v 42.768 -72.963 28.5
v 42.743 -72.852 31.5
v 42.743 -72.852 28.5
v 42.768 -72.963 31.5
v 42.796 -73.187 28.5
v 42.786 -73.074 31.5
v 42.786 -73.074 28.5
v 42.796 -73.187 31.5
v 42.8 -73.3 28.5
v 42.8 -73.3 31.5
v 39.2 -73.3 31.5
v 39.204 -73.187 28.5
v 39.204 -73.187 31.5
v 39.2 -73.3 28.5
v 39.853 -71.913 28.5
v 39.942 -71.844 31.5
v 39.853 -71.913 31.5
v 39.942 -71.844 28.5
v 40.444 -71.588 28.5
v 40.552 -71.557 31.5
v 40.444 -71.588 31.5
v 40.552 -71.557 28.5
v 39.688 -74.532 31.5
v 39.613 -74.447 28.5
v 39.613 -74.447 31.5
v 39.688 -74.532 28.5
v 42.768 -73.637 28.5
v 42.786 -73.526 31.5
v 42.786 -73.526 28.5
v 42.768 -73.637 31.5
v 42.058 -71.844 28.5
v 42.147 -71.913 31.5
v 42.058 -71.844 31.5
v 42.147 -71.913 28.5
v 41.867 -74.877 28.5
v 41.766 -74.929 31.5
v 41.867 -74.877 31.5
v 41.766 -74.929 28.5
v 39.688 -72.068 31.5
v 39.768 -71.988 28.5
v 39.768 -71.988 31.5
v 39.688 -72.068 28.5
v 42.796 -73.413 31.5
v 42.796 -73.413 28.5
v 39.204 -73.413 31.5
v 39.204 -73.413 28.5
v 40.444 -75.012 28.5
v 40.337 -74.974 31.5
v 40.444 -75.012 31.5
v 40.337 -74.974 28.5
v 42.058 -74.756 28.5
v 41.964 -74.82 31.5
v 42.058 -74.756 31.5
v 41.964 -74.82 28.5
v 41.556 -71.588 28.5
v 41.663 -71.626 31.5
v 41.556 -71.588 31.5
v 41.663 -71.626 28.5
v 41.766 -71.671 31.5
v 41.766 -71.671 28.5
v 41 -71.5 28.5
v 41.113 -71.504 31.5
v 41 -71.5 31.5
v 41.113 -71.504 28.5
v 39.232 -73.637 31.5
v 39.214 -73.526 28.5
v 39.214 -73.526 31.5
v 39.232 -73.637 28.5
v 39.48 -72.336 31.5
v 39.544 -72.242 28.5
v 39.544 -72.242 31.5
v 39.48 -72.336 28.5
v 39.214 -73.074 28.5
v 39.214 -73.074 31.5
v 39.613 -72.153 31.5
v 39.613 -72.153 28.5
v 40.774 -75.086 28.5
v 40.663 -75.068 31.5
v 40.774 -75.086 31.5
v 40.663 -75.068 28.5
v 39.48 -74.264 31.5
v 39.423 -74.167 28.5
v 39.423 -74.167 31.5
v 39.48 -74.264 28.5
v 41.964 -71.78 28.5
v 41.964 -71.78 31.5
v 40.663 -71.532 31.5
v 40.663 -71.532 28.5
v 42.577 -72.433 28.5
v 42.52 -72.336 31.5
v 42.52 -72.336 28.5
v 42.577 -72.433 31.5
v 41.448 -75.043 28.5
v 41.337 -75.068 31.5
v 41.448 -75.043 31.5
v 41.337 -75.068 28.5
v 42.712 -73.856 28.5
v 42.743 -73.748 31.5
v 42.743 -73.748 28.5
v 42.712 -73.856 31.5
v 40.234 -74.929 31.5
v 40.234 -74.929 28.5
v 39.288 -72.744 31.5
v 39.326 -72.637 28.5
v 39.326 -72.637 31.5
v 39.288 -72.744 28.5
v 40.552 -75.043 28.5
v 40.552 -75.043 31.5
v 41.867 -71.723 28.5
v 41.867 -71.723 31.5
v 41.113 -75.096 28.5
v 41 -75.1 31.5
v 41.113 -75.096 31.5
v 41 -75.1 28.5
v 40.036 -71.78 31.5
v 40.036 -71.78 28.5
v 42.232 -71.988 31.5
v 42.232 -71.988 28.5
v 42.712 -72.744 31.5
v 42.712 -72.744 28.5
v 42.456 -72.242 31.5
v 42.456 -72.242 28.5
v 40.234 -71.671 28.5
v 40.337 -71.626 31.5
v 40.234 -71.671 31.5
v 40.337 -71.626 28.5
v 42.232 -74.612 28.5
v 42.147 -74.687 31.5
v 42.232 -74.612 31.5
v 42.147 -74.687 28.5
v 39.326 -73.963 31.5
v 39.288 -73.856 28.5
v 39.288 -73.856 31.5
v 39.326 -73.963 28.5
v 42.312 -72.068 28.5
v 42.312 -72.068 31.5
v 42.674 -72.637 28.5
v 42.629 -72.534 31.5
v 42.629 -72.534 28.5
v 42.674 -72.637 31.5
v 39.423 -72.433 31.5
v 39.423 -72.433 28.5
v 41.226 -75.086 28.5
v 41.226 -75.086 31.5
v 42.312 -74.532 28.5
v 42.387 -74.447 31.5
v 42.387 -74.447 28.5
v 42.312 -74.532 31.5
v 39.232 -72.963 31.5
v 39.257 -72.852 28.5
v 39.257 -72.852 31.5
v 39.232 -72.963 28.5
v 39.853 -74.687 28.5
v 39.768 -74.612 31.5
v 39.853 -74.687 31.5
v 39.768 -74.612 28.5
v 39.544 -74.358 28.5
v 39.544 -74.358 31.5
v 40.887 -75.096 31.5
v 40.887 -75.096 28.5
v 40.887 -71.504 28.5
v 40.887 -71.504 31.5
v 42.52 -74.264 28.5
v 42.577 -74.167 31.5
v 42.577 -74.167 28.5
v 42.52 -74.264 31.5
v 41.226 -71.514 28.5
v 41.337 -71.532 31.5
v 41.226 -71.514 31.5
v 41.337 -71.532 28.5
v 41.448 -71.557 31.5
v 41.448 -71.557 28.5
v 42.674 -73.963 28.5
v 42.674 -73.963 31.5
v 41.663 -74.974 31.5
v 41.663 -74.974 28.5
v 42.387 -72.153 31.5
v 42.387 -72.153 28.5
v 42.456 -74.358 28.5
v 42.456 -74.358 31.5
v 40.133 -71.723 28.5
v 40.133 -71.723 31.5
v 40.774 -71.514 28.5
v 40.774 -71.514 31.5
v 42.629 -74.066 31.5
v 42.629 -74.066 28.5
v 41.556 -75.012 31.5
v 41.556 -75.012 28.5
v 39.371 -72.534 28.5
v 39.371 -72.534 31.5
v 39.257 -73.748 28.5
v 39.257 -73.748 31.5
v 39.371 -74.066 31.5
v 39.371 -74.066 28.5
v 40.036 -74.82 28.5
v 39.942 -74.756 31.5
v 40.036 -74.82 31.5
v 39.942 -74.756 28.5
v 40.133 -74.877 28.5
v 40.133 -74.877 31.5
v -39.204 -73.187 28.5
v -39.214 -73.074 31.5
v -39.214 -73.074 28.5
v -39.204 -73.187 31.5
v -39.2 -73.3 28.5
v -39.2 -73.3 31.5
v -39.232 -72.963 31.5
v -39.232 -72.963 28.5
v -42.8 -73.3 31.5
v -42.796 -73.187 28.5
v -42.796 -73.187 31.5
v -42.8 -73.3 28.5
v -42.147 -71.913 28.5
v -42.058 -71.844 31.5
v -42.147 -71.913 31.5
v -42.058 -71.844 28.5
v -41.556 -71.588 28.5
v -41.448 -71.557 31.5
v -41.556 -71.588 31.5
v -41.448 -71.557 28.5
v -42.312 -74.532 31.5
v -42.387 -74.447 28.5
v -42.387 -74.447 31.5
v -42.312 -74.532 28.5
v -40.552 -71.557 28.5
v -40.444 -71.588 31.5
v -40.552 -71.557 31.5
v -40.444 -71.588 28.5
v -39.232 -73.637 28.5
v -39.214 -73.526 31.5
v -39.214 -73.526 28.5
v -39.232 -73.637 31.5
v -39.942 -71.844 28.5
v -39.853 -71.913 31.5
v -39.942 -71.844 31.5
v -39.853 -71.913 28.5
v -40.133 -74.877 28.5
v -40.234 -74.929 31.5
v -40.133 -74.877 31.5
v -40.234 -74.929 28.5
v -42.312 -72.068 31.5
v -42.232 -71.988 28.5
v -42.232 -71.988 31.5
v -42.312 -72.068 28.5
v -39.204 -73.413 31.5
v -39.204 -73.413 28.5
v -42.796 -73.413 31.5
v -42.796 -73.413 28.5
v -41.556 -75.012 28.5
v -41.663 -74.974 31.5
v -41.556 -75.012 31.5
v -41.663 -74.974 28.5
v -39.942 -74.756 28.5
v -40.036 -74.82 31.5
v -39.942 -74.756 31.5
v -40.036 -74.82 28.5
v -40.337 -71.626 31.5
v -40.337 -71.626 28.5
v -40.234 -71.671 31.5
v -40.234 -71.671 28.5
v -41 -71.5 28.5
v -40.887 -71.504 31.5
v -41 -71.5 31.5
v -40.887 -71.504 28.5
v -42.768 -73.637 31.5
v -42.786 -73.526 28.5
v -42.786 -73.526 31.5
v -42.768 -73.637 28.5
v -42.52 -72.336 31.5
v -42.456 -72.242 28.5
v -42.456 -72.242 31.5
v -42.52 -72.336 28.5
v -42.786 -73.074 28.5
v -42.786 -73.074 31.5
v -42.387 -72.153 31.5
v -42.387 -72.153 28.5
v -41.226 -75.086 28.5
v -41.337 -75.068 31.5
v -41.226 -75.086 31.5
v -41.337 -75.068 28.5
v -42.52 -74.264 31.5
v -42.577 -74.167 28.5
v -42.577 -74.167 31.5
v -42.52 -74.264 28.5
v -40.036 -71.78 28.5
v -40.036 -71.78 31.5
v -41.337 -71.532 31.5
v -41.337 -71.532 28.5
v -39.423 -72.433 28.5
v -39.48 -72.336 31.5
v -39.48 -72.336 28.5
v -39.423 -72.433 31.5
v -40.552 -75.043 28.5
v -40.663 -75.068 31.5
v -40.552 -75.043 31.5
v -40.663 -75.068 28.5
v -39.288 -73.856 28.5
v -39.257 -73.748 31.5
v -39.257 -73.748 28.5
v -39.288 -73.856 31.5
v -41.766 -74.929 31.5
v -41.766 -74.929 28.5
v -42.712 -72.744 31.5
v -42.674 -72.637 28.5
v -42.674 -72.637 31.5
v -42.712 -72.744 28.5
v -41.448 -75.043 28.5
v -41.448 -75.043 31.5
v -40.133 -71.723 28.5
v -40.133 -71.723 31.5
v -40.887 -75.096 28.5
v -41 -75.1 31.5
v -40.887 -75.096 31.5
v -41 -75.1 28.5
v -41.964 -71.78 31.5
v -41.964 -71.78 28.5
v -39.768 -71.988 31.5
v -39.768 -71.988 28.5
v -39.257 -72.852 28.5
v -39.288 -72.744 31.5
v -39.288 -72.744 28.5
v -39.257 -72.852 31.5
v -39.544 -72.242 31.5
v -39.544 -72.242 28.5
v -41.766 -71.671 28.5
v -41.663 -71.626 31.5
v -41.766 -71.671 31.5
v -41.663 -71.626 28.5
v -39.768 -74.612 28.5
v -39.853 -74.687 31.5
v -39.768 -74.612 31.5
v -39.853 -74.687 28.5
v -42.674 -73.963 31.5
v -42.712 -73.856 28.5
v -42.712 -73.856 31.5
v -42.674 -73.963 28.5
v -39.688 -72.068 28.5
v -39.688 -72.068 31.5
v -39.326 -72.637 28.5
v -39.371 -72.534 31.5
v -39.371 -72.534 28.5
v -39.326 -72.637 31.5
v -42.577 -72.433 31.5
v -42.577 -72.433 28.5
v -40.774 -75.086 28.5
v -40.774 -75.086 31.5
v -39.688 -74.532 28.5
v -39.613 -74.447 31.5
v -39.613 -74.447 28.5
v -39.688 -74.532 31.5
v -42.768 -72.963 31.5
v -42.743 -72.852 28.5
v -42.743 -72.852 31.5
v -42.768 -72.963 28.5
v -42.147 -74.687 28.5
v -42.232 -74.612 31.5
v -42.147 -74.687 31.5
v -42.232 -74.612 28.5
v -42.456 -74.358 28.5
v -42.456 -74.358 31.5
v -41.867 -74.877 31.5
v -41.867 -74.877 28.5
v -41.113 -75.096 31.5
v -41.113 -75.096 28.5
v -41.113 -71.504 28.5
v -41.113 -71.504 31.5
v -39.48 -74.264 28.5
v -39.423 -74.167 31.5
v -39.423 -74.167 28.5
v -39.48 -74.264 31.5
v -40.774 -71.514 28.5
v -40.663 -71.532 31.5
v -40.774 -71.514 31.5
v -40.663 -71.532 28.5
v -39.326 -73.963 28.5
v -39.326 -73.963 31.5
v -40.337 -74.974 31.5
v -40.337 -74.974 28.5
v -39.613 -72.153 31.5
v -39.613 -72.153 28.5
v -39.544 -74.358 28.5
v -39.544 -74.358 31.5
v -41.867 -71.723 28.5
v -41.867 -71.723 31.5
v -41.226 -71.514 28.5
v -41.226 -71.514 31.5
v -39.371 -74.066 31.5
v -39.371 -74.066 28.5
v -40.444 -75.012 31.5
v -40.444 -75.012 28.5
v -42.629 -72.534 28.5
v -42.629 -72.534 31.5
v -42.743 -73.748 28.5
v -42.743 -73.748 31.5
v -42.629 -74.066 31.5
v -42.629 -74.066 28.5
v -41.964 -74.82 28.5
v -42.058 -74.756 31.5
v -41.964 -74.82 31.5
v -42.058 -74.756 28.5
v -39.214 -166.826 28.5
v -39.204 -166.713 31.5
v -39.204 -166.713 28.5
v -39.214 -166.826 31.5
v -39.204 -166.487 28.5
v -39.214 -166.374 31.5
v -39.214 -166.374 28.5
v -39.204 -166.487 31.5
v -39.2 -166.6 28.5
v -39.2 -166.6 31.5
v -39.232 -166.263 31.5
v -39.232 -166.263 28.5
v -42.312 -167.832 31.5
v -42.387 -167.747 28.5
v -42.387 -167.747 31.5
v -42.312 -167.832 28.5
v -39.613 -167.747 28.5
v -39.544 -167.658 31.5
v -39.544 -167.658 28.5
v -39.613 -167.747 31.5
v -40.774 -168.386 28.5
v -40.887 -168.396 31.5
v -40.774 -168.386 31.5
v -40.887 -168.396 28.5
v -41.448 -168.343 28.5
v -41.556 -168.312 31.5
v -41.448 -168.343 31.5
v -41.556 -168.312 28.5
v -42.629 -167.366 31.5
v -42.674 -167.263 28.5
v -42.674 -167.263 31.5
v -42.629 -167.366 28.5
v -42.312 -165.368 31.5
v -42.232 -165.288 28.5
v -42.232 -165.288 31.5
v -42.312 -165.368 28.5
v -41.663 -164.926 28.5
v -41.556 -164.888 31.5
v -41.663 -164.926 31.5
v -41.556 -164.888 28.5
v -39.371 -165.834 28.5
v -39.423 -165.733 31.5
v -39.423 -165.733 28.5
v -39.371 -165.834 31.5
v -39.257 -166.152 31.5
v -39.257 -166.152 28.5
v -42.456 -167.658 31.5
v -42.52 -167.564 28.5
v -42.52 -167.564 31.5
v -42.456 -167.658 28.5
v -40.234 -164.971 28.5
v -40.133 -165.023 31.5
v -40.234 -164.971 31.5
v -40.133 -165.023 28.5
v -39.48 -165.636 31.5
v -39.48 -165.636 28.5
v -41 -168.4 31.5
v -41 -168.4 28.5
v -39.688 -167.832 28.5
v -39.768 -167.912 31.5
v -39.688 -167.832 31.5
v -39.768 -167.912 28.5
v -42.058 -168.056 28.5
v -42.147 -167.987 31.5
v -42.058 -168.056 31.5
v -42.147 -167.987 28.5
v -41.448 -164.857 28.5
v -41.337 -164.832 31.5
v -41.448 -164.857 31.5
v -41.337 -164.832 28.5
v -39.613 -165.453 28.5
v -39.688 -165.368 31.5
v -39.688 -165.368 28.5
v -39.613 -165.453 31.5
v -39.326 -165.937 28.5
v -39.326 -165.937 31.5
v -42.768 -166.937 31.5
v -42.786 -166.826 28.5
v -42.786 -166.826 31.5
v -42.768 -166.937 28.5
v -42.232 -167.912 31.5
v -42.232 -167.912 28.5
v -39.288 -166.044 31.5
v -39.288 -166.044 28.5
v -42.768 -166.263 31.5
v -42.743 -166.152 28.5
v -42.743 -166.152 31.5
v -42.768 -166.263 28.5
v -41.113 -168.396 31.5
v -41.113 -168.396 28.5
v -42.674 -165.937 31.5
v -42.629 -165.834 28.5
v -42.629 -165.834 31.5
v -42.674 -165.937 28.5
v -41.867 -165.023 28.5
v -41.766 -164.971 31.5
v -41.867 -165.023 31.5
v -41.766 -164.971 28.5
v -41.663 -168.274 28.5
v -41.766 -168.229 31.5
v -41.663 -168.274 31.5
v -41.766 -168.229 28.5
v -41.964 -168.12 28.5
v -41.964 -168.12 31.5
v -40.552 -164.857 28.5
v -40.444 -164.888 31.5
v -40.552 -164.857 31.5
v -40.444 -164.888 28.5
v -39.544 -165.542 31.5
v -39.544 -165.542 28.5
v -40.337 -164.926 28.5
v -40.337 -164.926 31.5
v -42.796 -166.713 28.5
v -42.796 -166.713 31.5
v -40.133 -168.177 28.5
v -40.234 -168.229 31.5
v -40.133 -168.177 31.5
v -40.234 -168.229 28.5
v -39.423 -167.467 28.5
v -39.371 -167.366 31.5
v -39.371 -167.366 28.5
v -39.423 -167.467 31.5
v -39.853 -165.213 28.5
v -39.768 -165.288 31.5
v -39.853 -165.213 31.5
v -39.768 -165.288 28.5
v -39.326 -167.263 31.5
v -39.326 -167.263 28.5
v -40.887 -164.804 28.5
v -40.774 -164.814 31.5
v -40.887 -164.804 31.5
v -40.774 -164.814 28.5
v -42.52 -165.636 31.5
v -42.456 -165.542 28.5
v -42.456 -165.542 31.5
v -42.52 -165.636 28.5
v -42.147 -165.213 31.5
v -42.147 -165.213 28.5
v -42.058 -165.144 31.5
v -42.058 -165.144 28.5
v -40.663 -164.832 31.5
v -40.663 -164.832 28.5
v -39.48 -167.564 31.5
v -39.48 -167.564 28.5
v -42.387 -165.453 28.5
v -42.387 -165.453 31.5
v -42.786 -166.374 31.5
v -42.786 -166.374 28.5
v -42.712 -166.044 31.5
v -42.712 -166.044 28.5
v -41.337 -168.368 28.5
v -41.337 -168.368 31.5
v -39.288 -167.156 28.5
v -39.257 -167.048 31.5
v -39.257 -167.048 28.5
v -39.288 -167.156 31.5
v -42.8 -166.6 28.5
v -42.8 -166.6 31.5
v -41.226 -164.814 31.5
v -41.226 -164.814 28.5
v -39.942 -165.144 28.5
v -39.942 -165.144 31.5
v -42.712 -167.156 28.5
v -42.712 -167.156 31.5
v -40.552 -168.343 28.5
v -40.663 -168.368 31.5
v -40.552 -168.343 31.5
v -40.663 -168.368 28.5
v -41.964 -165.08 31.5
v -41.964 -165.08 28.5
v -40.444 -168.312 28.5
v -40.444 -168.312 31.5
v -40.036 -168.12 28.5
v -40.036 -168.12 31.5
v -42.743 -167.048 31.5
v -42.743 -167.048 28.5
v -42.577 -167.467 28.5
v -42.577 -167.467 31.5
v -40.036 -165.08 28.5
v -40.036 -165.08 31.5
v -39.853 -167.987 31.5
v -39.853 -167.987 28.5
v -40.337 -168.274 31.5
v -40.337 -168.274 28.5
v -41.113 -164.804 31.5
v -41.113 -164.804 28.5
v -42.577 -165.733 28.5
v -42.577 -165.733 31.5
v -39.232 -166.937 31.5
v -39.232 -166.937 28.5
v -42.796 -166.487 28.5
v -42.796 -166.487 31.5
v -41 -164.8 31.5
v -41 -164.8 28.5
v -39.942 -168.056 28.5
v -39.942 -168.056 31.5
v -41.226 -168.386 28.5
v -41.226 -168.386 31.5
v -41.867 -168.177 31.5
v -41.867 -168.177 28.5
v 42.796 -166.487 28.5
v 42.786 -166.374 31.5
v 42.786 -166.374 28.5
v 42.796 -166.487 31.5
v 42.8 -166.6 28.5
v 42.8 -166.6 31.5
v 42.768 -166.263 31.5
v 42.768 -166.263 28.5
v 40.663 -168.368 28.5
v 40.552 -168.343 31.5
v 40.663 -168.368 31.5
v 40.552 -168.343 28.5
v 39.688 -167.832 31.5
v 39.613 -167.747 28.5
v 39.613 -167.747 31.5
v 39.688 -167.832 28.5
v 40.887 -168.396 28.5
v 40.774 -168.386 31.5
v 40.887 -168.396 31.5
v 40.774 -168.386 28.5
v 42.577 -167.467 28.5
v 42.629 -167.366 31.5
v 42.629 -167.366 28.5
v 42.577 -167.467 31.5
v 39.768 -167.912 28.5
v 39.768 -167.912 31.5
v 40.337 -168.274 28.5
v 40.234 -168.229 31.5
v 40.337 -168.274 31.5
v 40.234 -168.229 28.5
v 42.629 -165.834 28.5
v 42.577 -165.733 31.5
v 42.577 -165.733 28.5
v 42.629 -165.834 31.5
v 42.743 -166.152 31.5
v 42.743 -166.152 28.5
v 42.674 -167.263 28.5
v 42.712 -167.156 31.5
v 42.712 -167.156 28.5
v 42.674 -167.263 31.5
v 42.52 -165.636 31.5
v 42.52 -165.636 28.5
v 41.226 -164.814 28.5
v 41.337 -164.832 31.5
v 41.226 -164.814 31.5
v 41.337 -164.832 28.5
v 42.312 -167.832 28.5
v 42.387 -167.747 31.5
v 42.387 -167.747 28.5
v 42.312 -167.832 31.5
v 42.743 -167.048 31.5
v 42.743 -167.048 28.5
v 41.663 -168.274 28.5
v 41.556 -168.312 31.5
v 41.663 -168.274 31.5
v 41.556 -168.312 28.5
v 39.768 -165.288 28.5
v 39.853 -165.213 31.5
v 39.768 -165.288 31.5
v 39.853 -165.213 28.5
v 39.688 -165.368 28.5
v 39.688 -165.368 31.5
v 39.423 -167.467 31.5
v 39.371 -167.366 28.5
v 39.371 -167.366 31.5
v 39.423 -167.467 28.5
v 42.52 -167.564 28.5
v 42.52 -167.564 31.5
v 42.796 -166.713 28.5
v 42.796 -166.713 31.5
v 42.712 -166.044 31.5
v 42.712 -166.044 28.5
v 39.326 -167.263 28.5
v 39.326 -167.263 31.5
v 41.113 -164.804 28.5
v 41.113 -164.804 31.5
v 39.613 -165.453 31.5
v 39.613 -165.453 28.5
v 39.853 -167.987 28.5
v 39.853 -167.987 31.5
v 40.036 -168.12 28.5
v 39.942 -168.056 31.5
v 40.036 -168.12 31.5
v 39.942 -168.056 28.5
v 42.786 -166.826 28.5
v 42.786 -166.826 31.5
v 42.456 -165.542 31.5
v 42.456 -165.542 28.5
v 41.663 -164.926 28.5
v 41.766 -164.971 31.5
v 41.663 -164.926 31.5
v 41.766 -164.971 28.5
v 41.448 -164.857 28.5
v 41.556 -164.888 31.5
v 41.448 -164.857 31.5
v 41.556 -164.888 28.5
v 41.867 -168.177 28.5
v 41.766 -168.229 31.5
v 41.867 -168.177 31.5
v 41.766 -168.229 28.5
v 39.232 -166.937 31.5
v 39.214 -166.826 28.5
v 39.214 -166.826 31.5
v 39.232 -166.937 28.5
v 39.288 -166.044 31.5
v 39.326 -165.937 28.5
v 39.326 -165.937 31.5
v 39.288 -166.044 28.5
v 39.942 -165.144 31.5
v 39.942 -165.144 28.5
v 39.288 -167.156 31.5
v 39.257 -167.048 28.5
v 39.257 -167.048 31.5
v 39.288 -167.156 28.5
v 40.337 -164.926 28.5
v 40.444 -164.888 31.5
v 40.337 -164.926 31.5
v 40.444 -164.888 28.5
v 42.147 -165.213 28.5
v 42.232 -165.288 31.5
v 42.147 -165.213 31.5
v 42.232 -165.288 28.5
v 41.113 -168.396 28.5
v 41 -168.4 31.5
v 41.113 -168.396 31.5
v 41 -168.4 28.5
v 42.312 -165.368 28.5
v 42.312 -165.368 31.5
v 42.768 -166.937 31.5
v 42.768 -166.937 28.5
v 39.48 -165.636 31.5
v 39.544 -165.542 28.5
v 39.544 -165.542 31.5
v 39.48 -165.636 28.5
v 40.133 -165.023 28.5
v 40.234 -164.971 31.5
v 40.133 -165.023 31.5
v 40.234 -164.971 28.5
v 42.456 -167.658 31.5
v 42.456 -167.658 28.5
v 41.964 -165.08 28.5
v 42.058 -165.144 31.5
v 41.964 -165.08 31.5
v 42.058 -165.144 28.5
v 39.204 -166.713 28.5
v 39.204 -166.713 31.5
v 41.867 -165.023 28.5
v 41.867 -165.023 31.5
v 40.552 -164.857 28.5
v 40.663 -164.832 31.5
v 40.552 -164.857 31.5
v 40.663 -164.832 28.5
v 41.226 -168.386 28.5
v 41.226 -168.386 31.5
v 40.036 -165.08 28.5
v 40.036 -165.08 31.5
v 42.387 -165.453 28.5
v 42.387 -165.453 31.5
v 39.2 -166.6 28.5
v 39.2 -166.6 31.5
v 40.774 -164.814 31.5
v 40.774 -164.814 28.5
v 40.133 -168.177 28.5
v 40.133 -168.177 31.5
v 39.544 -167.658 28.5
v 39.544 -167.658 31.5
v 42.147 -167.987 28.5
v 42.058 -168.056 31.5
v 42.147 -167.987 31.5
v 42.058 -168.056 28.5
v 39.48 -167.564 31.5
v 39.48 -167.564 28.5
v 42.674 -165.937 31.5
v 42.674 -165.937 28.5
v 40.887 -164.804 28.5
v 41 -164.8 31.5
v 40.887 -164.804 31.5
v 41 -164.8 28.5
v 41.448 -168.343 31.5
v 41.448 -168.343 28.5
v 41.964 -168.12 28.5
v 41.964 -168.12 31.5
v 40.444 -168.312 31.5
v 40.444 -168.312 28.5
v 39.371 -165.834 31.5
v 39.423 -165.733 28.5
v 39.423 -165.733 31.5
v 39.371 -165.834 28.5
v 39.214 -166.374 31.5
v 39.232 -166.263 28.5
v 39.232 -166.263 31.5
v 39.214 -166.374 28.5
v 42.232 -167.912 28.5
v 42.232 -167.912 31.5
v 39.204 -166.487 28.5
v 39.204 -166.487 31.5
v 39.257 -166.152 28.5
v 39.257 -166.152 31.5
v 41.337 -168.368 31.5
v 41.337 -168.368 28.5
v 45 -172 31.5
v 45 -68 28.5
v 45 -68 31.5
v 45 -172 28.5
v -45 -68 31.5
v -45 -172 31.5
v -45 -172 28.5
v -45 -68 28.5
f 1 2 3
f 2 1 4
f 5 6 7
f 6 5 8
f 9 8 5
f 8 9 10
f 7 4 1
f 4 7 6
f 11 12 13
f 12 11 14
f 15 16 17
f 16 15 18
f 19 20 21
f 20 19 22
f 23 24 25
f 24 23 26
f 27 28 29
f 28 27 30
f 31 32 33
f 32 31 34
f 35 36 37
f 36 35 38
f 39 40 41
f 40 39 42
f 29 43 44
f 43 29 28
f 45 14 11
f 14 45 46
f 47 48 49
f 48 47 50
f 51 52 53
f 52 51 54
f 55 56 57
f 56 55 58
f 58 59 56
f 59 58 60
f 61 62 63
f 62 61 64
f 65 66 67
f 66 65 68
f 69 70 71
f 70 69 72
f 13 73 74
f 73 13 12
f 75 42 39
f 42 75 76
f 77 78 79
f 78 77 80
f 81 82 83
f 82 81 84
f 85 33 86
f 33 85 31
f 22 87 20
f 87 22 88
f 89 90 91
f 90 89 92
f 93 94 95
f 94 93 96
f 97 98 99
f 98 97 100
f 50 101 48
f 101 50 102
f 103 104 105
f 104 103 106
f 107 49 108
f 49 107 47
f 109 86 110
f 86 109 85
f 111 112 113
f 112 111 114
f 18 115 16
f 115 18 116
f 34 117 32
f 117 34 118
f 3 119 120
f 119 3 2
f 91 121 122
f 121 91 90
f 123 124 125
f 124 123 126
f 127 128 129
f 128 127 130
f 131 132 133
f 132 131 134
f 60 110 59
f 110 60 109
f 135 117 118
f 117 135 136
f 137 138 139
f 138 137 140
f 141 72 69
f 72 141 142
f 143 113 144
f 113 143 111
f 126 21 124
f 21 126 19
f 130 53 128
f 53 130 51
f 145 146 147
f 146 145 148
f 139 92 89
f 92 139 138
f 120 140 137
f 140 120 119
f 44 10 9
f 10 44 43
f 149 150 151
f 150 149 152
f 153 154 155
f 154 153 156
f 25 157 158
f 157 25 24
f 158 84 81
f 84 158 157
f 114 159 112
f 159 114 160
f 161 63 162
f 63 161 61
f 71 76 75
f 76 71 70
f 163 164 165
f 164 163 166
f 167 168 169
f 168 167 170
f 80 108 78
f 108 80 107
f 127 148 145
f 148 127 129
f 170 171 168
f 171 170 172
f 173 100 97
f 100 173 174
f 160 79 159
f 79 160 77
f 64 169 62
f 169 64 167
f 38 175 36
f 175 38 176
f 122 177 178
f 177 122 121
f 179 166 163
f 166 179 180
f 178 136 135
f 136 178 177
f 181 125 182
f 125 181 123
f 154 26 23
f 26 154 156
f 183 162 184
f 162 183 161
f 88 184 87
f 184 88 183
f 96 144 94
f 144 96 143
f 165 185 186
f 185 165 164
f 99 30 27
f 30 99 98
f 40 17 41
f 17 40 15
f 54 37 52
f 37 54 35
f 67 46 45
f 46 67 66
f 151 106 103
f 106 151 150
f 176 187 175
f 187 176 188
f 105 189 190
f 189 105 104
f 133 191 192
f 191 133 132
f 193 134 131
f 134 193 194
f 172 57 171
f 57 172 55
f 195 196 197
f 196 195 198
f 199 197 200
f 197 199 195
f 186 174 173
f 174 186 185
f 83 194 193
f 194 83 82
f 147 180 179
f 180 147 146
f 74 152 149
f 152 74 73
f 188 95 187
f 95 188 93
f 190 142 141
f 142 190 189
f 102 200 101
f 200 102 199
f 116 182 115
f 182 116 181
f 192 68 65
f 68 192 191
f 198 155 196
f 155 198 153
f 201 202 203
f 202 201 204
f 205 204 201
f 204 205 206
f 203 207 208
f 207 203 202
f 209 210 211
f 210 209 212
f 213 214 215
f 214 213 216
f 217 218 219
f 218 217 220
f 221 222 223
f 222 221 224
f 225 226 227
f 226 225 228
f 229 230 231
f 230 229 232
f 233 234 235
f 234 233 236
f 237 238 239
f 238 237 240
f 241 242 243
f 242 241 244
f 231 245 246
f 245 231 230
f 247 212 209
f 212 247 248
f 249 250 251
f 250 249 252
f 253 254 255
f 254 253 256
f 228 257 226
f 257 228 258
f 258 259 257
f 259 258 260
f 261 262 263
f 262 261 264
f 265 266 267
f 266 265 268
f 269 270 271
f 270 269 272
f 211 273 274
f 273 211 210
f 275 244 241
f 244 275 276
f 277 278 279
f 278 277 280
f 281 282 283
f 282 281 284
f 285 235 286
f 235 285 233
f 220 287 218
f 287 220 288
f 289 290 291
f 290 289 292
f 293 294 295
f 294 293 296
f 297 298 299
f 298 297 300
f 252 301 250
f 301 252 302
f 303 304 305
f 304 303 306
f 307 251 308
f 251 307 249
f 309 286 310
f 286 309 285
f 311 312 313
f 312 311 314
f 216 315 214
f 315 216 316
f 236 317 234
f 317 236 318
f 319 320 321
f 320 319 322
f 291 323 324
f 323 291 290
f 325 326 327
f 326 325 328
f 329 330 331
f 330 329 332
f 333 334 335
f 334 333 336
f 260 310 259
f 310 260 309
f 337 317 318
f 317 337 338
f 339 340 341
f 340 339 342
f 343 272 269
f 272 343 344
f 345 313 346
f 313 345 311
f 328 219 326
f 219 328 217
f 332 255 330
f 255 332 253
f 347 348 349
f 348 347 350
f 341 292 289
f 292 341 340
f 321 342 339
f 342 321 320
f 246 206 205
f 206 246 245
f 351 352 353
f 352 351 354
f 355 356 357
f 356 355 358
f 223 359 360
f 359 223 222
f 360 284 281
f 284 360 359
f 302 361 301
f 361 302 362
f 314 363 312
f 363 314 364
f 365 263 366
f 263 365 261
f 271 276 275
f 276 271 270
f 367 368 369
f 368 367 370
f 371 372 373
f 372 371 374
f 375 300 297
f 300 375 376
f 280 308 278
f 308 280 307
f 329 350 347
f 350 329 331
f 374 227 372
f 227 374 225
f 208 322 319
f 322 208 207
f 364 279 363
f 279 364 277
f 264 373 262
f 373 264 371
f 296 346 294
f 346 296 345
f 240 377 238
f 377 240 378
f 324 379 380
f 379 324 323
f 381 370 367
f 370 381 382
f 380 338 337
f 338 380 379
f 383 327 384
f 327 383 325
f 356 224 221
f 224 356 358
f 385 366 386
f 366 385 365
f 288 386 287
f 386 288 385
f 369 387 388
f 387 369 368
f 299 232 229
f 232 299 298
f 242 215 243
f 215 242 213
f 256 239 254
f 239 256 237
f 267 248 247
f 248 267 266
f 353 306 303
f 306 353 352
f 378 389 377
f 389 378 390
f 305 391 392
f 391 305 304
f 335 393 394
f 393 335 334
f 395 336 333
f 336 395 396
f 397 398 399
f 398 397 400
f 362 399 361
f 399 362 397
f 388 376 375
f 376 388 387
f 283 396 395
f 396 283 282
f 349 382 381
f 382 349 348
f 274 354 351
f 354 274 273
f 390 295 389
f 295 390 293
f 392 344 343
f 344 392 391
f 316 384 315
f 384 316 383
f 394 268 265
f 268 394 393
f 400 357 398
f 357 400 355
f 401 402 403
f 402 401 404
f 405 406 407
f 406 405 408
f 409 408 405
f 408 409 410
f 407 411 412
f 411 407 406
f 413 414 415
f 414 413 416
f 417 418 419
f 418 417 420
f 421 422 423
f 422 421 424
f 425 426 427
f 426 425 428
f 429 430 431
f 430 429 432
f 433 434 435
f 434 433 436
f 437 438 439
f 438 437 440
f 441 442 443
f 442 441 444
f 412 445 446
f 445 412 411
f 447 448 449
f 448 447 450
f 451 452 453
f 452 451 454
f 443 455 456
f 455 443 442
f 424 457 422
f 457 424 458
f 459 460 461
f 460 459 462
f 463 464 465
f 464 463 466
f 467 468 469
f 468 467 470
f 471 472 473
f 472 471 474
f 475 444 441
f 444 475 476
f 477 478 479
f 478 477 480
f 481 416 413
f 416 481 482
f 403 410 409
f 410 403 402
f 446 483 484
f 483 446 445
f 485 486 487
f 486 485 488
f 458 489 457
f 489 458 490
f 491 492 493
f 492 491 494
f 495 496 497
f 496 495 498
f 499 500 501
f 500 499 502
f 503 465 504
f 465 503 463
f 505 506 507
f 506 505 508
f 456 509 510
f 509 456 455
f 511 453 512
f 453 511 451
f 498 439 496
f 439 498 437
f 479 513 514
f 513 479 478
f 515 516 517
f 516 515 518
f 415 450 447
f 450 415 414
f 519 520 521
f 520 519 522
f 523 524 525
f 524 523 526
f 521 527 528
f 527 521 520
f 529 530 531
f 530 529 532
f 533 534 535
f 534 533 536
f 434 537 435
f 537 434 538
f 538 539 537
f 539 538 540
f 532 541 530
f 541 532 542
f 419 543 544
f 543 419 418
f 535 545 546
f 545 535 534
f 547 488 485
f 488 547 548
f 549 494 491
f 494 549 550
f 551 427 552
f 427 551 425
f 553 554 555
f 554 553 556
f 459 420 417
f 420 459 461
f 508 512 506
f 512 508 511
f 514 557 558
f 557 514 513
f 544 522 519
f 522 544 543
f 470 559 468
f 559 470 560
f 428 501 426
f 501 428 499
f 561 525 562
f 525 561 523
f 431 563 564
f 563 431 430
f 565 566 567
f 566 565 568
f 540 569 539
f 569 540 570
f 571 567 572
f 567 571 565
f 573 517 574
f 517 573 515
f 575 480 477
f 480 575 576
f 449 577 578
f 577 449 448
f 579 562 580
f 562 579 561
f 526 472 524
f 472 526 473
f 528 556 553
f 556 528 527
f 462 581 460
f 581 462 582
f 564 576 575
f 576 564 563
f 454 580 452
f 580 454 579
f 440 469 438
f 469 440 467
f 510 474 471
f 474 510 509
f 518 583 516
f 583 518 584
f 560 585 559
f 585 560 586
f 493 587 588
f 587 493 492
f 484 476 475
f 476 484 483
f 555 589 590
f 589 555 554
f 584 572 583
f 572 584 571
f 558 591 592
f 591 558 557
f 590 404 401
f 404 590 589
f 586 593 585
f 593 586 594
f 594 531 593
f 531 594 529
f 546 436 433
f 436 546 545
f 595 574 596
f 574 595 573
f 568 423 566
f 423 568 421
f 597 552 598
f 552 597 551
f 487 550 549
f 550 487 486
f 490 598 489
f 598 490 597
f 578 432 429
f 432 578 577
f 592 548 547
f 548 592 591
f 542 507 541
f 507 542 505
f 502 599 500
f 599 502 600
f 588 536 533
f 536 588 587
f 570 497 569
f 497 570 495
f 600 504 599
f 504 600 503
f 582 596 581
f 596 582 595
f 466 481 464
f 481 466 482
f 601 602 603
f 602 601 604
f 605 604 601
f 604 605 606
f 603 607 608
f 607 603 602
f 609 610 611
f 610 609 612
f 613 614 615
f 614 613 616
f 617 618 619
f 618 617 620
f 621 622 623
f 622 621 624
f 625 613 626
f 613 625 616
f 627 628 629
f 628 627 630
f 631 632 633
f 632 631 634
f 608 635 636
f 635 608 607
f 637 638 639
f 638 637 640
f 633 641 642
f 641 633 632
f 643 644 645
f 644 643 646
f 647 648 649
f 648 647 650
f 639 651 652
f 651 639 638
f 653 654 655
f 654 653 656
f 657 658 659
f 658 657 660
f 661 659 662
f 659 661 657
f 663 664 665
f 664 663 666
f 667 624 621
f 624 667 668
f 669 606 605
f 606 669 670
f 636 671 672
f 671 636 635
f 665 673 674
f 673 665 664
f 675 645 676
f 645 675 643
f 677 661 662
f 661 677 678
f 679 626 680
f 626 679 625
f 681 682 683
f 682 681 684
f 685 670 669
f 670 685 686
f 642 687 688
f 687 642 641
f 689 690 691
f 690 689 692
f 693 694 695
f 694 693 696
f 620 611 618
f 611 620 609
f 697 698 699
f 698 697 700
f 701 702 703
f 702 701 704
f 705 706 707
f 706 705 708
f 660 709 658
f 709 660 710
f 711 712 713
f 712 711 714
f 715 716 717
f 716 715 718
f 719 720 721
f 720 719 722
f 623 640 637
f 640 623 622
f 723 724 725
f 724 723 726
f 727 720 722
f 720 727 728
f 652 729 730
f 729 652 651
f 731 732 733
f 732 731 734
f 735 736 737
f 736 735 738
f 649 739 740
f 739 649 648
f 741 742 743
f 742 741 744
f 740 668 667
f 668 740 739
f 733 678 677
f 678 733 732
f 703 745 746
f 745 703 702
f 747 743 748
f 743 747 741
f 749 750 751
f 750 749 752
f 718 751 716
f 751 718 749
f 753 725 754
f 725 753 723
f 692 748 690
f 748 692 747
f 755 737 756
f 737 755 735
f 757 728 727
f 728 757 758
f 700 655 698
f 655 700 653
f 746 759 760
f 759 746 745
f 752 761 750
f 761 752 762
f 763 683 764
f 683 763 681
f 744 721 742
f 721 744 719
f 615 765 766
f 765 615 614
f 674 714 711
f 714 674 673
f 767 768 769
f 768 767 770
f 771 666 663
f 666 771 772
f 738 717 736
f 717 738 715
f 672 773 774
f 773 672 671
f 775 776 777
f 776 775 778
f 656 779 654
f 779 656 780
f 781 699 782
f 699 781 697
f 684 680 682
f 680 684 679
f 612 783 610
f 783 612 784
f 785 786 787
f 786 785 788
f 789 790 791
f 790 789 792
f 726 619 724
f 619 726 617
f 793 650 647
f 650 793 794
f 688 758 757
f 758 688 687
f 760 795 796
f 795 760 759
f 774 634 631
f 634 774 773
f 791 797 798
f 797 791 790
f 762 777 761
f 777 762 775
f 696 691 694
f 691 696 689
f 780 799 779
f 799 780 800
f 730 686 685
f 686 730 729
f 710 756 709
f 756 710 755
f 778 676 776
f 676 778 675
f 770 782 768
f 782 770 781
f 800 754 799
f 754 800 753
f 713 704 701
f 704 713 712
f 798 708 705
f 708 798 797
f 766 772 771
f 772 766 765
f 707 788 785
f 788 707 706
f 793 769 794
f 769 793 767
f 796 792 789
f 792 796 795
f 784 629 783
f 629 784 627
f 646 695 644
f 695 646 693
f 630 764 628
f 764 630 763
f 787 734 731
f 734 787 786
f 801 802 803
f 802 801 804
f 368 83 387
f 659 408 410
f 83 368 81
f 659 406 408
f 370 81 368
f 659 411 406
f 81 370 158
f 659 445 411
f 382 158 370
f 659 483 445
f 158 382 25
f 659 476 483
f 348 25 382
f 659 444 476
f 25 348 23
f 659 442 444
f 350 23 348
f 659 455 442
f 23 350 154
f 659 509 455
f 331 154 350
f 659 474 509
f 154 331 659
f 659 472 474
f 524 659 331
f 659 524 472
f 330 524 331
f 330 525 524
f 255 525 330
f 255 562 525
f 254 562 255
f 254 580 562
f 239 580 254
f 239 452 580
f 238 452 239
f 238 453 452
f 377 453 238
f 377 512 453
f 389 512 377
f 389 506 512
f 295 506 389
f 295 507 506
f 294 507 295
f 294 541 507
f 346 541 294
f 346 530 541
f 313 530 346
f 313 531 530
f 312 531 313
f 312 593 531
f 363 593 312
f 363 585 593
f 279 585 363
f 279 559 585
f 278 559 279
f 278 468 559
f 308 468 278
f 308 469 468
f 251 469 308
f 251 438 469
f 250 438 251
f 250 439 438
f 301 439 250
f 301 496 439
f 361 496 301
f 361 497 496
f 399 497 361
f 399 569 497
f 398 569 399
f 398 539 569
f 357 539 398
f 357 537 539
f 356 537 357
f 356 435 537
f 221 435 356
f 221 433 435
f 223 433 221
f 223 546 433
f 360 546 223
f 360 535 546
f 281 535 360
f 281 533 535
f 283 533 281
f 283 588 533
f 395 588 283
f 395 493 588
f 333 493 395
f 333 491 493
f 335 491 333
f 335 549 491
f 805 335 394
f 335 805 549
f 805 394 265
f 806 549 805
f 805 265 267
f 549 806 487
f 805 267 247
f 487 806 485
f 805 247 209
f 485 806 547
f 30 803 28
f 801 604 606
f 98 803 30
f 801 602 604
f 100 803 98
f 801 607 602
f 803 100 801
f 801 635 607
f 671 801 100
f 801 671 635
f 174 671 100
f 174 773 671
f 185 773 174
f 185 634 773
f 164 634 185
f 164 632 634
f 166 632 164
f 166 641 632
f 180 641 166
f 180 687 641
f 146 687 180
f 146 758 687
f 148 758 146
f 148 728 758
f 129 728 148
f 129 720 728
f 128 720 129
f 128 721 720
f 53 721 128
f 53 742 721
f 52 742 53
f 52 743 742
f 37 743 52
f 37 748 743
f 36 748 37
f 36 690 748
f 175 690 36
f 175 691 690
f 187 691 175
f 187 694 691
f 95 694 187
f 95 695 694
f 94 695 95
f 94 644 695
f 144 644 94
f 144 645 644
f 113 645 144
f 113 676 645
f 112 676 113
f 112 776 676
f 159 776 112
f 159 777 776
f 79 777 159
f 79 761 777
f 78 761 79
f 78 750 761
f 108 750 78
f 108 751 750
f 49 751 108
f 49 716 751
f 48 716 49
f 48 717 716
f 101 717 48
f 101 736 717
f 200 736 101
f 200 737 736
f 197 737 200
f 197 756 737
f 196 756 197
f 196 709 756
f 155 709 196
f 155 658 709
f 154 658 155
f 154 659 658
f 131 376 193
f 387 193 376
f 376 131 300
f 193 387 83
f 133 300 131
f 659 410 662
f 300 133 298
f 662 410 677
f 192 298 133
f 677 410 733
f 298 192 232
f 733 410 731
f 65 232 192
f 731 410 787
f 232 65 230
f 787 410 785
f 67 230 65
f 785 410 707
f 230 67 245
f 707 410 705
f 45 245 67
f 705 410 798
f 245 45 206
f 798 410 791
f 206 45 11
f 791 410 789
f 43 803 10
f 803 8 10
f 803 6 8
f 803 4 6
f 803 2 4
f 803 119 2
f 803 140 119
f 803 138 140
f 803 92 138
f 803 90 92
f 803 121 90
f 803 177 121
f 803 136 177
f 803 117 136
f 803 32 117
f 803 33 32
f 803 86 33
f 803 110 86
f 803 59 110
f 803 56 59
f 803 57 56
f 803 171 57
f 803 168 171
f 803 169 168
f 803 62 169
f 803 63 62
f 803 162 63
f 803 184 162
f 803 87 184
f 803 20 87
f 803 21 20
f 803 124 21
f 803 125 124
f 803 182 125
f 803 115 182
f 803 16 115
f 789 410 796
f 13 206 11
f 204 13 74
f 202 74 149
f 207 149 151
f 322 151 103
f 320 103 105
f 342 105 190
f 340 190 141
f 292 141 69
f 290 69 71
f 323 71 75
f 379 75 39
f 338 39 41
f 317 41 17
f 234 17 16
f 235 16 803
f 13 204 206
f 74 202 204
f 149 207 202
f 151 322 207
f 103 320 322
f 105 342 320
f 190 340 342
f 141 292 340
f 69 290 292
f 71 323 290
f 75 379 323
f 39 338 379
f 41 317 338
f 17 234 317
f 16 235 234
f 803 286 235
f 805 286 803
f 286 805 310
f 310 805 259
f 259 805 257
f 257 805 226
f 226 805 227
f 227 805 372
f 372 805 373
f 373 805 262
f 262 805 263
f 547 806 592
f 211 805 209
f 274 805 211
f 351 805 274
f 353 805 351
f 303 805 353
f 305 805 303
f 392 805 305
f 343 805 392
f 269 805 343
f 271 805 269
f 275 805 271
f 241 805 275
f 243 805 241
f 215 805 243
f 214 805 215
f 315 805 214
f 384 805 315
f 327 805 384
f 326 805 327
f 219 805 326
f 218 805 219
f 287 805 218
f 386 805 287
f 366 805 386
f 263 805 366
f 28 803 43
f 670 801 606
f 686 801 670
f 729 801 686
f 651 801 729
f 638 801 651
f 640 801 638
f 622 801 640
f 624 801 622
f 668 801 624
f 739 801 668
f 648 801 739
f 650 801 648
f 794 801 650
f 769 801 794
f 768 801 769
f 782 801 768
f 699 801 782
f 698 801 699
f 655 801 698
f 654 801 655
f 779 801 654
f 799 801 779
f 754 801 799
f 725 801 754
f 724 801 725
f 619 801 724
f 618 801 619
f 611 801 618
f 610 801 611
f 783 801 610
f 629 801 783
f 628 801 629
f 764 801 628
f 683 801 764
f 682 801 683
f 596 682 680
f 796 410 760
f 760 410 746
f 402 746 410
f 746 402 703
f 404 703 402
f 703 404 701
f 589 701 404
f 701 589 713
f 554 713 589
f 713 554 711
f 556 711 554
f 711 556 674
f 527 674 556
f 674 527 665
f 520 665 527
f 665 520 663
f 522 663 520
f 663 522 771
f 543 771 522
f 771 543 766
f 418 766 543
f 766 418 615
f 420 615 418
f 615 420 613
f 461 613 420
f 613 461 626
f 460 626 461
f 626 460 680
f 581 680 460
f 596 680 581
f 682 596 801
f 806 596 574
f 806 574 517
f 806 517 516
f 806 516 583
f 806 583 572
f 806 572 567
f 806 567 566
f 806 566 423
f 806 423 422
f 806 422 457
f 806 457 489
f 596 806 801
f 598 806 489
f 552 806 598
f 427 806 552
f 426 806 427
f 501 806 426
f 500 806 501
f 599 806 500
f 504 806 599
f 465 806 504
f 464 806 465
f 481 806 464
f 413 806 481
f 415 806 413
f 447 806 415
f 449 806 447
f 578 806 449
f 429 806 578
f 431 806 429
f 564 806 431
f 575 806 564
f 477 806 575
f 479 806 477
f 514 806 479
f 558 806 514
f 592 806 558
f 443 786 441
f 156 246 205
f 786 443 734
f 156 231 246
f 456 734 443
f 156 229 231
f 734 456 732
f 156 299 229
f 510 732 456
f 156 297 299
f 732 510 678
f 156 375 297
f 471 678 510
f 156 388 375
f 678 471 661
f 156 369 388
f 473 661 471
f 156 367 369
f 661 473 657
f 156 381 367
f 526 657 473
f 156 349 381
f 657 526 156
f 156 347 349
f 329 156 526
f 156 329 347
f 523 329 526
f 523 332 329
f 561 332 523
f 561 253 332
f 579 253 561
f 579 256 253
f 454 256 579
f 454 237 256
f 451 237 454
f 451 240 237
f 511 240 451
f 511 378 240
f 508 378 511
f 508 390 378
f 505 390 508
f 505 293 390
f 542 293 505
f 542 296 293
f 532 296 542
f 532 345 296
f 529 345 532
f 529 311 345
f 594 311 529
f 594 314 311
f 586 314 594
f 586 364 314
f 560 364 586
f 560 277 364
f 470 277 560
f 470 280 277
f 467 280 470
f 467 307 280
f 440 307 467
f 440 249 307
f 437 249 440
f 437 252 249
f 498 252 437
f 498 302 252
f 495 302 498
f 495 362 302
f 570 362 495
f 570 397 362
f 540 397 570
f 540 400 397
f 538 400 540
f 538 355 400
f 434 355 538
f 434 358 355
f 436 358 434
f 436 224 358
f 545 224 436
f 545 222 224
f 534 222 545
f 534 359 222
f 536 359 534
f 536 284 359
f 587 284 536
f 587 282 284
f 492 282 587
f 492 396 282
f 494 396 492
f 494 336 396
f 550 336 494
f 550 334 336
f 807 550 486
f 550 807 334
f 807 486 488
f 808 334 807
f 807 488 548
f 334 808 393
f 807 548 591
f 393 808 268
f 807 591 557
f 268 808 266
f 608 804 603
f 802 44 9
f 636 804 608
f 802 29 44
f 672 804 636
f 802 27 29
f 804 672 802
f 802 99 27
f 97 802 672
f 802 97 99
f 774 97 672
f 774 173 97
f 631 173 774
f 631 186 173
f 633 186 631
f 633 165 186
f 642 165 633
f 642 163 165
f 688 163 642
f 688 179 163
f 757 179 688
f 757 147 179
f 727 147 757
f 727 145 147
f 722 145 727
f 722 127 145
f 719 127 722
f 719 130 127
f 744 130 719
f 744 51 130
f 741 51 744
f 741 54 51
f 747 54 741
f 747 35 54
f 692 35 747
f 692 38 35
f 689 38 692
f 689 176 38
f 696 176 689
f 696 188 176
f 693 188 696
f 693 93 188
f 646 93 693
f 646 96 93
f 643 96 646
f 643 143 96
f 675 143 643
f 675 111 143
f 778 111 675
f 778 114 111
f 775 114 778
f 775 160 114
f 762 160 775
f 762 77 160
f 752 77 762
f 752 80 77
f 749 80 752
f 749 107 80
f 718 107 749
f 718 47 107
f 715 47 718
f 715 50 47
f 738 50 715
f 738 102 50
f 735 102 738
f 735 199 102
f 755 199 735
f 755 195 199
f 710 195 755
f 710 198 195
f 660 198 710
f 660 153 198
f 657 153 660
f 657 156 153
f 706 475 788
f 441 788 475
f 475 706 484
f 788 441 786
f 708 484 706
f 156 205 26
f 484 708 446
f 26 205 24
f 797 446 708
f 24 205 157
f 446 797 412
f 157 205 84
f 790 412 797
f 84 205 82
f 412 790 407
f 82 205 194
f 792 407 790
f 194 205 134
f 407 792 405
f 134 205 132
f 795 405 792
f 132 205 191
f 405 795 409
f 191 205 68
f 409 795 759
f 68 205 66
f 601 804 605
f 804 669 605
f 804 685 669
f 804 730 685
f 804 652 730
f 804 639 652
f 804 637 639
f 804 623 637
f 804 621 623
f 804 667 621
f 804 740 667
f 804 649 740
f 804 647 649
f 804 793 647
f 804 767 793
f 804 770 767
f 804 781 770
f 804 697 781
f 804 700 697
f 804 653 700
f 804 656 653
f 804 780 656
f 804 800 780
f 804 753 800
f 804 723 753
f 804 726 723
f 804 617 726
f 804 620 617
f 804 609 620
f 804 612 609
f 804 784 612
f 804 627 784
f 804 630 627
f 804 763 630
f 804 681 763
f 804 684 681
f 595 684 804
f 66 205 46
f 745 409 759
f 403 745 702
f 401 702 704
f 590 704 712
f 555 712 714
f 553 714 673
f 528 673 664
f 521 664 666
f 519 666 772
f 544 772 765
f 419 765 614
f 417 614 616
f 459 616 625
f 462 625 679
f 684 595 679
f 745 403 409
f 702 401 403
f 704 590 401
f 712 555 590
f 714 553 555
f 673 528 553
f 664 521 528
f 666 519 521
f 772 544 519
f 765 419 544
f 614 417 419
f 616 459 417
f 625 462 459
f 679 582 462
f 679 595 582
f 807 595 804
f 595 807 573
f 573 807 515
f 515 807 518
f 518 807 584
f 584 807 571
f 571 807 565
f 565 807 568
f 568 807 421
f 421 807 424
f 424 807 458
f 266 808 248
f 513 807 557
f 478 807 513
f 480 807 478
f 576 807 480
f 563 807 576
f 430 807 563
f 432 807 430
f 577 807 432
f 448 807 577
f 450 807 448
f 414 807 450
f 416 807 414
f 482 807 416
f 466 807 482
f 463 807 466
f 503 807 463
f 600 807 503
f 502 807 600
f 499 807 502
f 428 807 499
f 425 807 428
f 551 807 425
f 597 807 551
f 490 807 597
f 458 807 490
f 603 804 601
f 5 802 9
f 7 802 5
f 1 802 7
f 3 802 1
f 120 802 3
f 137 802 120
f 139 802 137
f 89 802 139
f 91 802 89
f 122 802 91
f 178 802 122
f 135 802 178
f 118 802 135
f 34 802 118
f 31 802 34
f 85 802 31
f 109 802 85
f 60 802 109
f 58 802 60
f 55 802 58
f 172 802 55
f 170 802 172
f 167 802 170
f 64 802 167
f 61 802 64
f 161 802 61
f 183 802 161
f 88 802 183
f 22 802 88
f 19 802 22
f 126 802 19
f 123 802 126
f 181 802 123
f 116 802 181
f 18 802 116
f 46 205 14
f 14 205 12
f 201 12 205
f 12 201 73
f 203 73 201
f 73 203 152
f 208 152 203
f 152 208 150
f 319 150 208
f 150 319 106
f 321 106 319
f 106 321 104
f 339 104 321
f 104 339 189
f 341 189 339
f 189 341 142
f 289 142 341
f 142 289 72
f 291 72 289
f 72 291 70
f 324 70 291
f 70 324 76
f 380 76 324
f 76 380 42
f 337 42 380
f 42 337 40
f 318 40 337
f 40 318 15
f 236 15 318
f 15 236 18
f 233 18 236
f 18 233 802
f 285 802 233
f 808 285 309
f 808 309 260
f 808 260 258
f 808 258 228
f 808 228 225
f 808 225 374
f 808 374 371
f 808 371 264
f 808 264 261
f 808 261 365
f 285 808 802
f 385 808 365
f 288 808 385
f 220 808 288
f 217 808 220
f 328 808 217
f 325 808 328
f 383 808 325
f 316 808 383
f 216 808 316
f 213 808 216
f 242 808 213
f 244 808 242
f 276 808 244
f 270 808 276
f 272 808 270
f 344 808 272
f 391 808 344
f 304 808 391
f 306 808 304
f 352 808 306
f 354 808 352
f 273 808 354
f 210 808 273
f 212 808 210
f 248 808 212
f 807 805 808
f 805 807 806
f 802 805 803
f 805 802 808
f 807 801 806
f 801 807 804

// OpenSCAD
$fn=100;

module mounting_m25(innR=1.6, h=4){ // screw 
	difference(){
		color("orange") cylinder(r=3.8, h);
		cylinder(r=innR, h=10);
	}
}

module mounting_pi(){
	translate([-58/2,-49/2,0]) mounting_m25();
	translate([58/2,-49/2,0]) mounting_m25();
	translate([-58/2,49/2,0]) mounting_m25();
	translate([58/2,49/2,0]) mounting_m25();
	translate([-10,0,0]) cube([85,56,0.1], center=true);
} 

module rfid_antenna_housing(){
	difference(){
		cube([53,40,10], center=true); // rfid antenna outside;
		translate([0,-6,0]) cube([47,46,5], center=true); // rfid antenna groove;
		cube([36,25,18], center=true); //rfid antenna loop inside  
	}
}

module lcdPanel(){
		w=75;
		l=31;
		difference(){
		union(){
				translate([w/2,   l/2,0])cylinder(r=3.6, h=10);
				translate([w/2,  -l/2,0])cylinder(r=3.6, h=10);
				translate([-w/2, -l/2,0])cylinder(r=3.6, h=10);
				translate([-w/2,  l/2,0])cylinder(r=3.6, h=10);
			
		}
		union (){
			translate([w/2,   l/2,0])cylinder(r=1.6, h=11);
			translate([w/2,  -l/2,0])cylinder(r=1.6, h=11);
			translate([-w/2, -l/2,0])cylinder(r=1.6, h=11);
			translate([-w/2,  l/2,0])cylinder(r=1.6, h=11);
		}
		}

}

module baseboard(){
	difference(){
		color("grey") translate([0,-96,-3]) cube([90, 120, 4], center=true); // base board
#		translate([-39,-105,-2])cube([3.0, 11.5,5], center=true); // rfid board connection via the pins; 
//		translate([0,-150,0]) cube([40,20,5], center=true); // rfid antenna groove;
	}
} 
module sidewall(){
	color("blue") cube([2,100,30], center=true);
	translate([3,46.5,8]) difference( ) { cube([7,7,14], center=true); cylinder(r=1.9, h=43);}
	translate([3,-46.5,8]) difference( ) { cube([7,7,14], center=true); cylinder(r=1.9, h=43);}
}


module topCoverMounting() {
	mx=41;
	my=-73.3;
	my2=-166.6;
	color("blue") translate([mx,my,0])  cylinder(r=1.8,h=40);
	color("blue") translate([-mx,my,0]) cylinder(r=1.8,h=40);
	color("blue") translate([-mx,my2,0])cylinder(r=1.8,h=40);
	color("blue") translate([mx,my2,0]) cylinder(r=1.8,h=40);
} 

module topCover(){
	difference(){
		translate([0,-120,30]) cube([90, 104, 3], center=true);
		topCoverMounting();
	}
}


module rfid_antenna_housing(){
	difference(){
		cube([50,43,7], center=true); // rfid antenna outside;
#		translate([0,4,0]) cube([48,40,3], center=true); // rfid antenna groove;
   //     color("green") translate([12,2,0]) cube([30,37,3.2], center=true); // rfid antenna groove, expand for wires
		cube([41,29,30], center=true); //rfid antenna loop inside  
	}
}
       


module case(){
	union(){
			difference() {
				union(){
					translate([8,-143+8,-1.0]) rotate([0,0,-90]) mounting_pi(); // pi  // rpi
					bx=44;
					by=-120;
					translate([0,-33,0]) baseboard();
					translate([bx,by,13]) rotate([0,0,180]) sidewall();
					translate([-bx,by,13]) sidewall(); 
					translate([0,-214,-1.5]) rotate([0,0,90]) rfid_antenna_housing();
				} 
				translate([37,-170, 2]) cube([10, 50, 15]); 
			}
			difference(){
				translate([0,-171,13]) cube([90,2,30], center=true);// backwall
				translate([15,-170,3]) cube([28,10, 5], center=true); // sdcard slot  
				translate([-35,-170, 4]) rotate([90,0,0]) cylinder(r=5, h=20); //rfid antenna wire
			}
	}
}
//case();
topCover();
